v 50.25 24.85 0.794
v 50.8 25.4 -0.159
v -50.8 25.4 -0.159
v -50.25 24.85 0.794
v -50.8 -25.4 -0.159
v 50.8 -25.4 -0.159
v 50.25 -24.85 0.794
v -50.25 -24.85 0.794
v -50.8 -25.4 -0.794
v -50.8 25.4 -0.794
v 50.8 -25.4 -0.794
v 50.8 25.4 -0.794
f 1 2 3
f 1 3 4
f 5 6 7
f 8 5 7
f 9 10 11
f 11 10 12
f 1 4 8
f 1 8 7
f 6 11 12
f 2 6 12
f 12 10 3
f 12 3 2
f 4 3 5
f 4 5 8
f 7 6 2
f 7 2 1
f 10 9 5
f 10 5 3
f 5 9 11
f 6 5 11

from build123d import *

# Parameters (mm, degrees)
SKETCH3_W           = 101.6
SKETCH3_H           = 50.8
BOSS_EXTRUDE1_DEPTH = 0.635
SKETCH4_W           = 101.6
SKETCH4_H           = 50.8
BOSS_EXTRUDE2_DEPTH = 0.9525
BOSS_EXTRUDE2_TAPER = 30


with BuildPart() as part:
    # Sketch3 → Boss-Extrude1 (new body)
    with BuildSketch(Plane.XY.offset(-0.79375)):
        Rectangle(SKETCH3_W, SKETCH3_H)
    extrude(amount=BOSS_EXTRUDE1_DEPTH)

    # Sketch4 → Boss-Extrude2 (add)
    with BuildSketch(Plane.XY.offset(-0.15875)):
        Rectangle(SKETCH4_W, SKETCH4_H)
    extrude(amount=BOSS_EXTRUDE2_DEPTH, taper=BOSS_EXTRUDE2_TAPER)


solid = part.part
